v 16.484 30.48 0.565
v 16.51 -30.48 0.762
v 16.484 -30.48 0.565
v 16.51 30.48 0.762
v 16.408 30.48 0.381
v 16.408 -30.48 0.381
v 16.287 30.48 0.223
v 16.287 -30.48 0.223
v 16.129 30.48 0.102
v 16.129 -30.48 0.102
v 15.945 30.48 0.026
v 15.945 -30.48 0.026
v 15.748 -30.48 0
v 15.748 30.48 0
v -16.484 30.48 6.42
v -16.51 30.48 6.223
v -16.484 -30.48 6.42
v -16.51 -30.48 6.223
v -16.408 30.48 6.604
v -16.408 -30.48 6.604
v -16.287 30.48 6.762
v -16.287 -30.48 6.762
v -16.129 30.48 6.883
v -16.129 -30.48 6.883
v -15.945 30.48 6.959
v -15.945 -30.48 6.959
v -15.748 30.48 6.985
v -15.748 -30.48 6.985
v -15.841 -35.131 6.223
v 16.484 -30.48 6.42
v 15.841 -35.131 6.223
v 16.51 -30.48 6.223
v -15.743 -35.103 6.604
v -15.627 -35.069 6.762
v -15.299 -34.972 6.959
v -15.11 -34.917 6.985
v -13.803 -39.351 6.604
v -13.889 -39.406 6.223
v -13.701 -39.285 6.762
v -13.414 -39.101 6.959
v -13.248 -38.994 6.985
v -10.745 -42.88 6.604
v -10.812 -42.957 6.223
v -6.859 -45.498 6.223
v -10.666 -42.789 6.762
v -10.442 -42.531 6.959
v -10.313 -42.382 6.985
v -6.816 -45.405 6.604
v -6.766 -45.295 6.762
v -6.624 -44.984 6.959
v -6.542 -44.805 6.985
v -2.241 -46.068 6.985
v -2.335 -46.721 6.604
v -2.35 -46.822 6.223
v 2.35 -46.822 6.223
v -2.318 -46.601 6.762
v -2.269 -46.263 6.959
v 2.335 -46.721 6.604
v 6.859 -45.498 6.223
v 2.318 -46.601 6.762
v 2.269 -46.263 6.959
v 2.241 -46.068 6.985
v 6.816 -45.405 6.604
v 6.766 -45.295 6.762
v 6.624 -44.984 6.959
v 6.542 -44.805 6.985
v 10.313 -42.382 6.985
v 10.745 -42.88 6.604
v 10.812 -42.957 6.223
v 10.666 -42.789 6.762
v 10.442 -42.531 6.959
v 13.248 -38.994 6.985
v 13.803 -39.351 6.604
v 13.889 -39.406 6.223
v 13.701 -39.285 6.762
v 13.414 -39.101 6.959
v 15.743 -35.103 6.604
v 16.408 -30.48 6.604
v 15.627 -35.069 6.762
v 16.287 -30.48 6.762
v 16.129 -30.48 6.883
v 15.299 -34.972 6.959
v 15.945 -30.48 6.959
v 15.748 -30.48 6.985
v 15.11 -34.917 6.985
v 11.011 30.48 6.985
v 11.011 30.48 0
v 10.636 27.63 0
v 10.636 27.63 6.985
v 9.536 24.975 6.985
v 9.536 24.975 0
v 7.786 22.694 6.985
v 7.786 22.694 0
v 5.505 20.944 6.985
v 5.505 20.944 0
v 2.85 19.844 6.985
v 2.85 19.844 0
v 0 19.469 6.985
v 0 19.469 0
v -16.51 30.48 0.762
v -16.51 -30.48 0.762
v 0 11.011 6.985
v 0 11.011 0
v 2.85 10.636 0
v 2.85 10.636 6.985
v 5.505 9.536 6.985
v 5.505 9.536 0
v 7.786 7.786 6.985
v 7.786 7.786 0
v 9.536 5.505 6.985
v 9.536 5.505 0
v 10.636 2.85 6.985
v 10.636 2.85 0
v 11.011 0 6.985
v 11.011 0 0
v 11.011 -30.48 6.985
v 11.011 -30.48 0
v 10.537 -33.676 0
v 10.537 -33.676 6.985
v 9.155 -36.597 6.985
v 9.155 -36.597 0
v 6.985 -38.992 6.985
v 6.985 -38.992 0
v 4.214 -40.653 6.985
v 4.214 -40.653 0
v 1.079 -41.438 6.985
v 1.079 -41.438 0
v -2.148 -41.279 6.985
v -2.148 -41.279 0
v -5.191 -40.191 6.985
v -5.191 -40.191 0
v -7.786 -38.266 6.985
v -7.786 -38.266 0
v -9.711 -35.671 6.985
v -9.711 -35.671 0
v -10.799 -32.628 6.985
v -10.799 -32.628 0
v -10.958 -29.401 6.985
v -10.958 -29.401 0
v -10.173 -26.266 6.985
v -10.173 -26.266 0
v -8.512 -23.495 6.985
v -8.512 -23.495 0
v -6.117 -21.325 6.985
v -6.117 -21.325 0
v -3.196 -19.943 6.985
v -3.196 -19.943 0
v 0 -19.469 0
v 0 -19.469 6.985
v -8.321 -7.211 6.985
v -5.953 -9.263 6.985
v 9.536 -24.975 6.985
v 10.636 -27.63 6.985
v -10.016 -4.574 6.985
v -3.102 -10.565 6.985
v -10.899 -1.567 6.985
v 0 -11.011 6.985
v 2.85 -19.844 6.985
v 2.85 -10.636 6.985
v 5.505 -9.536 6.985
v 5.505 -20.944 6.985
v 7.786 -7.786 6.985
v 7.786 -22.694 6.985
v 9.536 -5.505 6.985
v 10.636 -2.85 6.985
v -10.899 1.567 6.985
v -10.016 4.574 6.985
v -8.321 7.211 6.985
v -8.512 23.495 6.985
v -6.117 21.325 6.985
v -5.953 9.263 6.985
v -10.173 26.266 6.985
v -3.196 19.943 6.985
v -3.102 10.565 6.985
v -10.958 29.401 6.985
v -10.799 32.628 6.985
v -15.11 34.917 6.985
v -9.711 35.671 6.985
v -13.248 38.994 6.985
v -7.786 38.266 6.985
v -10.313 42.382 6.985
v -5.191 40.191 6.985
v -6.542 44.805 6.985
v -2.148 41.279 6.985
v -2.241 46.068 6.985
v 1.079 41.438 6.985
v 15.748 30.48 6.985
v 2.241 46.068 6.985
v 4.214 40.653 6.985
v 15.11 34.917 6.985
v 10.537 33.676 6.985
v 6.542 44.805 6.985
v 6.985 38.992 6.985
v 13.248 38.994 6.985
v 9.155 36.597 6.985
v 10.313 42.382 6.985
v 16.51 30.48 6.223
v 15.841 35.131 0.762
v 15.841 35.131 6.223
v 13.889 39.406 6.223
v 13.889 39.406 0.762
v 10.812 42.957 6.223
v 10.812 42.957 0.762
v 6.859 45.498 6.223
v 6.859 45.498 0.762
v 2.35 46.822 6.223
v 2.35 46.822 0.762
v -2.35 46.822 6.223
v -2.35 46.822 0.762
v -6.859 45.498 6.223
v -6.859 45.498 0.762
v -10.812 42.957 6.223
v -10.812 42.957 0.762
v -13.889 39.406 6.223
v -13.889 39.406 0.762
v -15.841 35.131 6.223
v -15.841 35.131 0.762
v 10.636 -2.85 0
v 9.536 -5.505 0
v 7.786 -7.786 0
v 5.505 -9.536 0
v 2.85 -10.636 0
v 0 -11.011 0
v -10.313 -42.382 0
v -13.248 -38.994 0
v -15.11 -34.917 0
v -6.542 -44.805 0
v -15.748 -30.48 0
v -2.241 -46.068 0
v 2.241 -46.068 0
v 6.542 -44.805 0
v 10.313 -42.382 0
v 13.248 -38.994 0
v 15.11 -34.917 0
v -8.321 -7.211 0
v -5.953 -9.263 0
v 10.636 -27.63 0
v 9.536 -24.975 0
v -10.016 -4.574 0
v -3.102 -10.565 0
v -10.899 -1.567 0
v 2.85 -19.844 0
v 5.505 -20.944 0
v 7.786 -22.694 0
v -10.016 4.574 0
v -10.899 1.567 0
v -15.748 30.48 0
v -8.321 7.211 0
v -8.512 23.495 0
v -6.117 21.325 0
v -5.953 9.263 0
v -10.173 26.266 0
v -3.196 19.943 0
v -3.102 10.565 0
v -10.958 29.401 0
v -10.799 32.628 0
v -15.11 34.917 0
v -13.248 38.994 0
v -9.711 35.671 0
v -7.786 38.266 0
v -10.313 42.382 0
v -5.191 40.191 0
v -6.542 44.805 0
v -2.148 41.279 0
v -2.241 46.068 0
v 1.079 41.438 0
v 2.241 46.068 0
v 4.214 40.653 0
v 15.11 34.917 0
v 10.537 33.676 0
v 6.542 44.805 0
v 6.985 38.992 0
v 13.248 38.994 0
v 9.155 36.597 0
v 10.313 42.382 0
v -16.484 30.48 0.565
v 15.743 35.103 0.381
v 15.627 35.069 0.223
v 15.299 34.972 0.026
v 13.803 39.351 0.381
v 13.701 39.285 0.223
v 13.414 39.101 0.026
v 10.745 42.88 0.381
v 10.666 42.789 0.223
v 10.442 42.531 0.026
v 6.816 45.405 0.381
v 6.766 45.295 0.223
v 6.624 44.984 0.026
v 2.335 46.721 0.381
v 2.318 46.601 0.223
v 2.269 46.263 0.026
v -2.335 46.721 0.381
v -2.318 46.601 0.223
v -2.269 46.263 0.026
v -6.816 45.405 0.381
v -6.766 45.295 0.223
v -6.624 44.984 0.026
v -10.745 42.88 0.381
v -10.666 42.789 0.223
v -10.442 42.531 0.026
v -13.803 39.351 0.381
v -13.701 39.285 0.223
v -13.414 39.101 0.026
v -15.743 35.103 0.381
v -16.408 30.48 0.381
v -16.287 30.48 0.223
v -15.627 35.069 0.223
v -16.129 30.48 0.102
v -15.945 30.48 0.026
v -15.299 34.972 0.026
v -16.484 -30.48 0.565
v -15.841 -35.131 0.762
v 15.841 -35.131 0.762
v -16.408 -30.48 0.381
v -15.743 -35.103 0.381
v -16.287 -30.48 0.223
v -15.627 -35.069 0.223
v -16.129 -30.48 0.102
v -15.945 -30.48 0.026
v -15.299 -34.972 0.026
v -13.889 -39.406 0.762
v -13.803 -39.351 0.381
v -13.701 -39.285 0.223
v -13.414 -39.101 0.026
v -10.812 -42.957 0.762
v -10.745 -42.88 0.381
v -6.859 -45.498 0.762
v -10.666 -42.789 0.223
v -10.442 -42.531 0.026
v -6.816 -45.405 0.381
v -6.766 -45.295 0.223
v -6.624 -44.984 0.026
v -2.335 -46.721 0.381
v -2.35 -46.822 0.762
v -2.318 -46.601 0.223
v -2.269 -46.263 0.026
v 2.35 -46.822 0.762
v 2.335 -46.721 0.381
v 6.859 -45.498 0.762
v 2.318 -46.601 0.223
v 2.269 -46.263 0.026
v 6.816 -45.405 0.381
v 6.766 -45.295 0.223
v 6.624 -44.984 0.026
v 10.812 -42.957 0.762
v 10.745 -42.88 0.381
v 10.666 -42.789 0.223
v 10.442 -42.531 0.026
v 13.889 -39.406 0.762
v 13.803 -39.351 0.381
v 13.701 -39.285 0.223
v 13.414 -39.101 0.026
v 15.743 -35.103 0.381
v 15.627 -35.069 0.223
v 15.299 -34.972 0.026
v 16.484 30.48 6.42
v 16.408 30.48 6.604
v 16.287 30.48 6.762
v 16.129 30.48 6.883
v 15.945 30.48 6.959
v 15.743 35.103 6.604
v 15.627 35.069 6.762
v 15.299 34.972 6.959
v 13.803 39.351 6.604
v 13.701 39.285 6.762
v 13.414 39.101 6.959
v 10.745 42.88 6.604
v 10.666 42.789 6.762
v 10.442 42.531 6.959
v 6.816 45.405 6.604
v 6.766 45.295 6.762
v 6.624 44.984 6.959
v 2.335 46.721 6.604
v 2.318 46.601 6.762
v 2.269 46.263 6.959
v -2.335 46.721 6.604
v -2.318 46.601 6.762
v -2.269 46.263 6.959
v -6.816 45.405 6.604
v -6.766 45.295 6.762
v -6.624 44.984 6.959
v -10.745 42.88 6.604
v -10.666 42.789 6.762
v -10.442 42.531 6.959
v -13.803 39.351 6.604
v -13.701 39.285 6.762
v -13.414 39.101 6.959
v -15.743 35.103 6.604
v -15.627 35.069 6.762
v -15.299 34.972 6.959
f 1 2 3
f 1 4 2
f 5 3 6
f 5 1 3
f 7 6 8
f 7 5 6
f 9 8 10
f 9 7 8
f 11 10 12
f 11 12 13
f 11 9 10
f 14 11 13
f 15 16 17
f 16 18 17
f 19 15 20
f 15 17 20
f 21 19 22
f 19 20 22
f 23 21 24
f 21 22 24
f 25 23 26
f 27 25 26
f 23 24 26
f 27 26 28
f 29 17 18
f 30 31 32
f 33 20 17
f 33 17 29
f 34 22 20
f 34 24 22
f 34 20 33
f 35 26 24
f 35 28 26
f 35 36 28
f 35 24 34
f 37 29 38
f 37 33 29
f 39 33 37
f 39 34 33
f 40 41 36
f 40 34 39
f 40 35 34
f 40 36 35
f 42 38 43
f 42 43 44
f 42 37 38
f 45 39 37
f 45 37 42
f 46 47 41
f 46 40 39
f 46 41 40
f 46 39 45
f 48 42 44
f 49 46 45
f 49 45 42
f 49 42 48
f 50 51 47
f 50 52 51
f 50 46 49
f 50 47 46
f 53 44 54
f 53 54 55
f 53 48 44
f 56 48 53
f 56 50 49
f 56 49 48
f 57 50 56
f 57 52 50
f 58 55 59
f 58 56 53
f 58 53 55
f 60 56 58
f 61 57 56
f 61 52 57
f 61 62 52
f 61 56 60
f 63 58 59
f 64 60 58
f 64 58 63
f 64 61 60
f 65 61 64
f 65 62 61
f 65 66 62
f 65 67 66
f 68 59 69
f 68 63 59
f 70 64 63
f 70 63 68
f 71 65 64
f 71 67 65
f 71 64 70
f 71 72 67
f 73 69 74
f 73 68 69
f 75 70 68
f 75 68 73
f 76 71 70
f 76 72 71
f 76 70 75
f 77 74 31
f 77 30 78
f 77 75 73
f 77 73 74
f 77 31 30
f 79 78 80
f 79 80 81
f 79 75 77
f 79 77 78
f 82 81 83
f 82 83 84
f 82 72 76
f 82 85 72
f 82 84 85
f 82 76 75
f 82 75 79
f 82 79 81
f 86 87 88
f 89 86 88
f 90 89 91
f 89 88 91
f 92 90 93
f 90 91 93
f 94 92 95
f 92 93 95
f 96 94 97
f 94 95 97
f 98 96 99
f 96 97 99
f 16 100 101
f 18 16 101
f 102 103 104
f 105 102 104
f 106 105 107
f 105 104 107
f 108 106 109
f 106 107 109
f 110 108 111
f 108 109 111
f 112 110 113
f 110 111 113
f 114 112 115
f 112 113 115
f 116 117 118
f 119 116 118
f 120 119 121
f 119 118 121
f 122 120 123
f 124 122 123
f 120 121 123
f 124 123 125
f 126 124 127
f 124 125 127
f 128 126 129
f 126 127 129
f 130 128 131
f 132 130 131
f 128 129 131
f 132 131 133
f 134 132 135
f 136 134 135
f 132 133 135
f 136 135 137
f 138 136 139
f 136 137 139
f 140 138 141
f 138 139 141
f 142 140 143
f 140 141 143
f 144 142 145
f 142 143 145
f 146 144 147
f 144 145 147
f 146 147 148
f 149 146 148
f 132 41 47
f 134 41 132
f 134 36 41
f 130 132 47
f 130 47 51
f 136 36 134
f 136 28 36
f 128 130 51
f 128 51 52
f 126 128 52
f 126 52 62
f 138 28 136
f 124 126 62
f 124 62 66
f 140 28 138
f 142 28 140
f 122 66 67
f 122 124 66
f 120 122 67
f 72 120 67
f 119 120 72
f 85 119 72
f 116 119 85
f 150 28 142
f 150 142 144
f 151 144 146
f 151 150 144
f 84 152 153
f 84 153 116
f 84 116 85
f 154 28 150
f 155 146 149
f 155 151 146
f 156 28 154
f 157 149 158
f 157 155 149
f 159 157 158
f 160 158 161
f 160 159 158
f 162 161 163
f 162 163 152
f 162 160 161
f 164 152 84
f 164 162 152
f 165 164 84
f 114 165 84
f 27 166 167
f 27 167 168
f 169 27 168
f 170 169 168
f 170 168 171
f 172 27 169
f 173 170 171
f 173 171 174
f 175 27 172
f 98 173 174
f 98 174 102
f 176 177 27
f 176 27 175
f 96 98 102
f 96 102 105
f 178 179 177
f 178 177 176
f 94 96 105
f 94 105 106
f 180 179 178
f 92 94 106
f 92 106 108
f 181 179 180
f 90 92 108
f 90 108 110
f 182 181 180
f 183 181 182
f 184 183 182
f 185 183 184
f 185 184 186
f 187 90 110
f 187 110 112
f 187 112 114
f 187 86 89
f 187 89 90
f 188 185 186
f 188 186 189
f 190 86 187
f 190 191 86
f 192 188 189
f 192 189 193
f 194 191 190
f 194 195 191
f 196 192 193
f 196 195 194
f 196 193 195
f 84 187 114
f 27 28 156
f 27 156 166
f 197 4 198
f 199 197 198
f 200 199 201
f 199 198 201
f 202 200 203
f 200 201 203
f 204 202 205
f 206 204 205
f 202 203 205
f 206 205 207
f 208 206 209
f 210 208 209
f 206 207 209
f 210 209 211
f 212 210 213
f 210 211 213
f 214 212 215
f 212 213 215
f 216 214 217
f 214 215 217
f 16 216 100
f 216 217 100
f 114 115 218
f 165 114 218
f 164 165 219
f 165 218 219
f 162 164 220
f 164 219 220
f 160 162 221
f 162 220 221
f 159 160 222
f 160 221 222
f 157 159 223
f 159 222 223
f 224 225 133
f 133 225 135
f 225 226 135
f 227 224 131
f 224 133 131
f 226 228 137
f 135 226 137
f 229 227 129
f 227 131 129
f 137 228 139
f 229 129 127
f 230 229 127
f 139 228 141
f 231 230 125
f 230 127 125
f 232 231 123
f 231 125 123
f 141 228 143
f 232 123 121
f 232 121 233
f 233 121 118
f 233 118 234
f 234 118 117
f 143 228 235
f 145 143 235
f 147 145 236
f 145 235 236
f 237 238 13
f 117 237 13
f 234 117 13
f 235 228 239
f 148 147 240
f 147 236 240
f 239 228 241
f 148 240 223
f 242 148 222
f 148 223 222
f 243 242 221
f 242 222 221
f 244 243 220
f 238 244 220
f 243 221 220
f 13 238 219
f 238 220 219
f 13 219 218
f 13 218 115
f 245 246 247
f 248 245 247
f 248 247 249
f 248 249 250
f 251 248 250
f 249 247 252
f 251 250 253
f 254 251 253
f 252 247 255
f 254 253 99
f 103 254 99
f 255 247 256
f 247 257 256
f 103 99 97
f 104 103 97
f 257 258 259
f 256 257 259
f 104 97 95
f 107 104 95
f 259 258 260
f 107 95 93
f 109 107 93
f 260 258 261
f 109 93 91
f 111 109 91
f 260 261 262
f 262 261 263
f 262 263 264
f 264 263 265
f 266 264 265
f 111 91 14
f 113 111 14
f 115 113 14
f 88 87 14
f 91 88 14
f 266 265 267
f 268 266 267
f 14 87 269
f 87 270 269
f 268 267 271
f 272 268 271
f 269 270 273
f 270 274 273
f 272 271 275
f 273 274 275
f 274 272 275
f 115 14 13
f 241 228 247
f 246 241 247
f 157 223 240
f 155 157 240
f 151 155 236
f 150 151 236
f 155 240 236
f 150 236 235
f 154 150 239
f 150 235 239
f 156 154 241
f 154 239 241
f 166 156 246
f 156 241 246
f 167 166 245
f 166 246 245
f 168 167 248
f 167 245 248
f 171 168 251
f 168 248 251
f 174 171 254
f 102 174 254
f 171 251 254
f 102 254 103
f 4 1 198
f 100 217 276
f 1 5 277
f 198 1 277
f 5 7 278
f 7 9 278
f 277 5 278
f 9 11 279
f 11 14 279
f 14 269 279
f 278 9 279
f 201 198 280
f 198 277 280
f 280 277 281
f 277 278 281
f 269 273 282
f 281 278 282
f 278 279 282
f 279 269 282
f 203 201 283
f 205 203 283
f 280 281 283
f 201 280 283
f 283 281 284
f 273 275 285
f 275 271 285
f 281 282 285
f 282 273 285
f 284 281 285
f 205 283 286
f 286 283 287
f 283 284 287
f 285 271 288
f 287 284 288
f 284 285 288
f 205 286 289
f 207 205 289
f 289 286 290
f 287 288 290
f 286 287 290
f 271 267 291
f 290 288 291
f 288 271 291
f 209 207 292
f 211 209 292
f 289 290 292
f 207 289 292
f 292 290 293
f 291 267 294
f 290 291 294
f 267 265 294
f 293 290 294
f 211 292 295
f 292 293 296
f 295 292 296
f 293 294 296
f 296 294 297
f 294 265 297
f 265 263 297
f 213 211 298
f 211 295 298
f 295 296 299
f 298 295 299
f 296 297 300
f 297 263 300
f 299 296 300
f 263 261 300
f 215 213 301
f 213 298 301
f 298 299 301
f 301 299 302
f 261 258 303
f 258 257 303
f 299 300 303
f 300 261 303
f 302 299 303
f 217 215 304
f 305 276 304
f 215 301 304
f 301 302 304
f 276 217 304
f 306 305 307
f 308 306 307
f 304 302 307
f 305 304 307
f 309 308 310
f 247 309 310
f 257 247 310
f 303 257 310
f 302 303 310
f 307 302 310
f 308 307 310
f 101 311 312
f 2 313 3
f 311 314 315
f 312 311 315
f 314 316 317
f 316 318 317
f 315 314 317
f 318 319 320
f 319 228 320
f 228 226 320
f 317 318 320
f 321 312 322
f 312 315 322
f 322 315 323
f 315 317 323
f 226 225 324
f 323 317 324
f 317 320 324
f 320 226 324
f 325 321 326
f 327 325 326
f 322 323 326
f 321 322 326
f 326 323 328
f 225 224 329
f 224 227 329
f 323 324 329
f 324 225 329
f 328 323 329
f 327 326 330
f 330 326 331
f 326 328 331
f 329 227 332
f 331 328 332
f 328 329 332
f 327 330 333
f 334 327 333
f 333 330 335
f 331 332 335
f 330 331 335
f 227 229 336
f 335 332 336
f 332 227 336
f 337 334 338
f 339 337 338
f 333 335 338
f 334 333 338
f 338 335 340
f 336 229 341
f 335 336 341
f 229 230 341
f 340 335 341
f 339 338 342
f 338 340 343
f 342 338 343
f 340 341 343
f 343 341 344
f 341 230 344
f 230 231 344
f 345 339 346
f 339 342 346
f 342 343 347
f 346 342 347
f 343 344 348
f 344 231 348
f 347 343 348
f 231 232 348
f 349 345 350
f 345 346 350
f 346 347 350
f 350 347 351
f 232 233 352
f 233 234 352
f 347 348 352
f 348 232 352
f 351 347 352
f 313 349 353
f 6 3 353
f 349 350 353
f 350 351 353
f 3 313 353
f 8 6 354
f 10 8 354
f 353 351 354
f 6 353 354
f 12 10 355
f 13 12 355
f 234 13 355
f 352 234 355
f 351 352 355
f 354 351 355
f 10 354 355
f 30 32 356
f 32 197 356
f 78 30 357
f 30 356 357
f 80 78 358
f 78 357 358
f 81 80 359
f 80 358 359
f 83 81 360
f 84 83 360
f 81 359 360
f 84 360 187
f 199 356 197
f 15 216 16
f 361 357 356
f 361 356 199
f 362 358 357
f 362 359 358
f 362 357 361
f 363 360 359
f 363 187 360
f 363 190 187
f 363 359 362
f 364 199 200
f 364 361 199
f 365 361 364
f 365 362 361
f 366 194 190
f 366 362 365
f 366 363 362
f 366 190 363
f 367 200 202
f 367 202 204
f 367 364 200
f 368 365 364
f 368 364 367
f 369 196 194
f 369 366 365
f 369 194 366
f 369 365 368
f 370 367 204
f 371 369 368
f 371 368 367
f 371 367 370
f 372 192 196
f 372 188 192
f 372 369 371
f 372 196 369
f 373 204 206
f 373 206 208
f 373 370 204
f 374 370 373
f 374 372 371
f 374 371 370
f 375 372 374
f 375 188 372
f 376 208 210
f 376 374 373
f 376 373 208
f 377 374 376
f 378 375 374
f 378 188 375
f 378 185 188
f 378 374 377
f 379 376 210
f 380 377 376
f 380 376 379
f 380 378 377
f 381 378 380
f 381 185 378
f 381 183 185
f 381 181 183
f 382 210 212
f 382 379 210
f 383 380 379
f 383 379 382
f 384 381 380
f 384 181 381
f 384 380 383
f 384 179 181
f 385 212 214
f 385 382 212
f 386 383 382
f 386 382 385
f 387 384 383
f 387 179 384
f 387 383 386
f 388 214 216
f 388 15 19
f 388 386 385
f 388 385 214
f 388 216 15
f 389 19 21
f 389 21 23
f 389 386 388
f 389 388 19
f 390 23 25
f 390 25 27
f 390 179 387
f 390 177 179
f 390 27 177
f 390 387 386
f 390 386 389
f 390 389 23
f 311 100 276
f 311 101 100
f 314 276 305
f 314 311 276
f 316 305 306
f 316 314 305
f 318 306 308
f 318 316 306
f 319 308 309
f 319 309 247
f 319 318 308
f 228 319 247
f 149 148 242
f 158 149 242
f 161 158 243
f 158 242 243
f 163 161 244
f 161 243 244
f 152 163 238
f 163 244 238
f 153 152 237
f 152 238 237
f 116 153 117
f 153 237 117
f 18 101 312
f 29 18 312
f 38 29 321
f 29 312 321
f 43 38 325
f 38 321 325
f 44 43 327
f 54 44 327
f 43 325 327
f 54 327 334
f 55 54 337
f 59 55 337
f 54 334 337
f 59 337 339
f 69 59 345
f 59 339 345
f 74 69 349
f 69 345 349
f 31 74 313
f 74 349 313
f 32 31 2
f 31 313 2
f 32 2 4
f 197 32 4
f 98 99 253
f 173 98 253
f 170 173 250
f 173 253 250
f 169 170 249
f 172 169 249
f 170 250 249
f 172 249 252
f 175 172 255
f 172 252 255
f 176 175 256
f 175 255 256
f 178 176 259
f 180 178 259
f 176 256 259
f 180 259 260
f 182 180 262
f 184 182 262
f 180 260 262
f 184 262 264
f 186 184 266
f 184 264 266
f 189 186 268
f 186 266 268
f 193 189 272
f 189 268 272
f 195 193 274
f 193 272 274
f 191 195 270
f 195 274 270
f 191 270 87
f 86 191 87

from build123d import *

# Parameters (mm, degrees)
F1_DEPTH = 6.985
F2_R     = 0.762
F3_R     = 0.762


with BuildPart() as f1:
    # F0 (on Top) → F1 (new body)
    with BuildSketch(Plane.XY):
        with BuildLine():
            ThreePointArc((0, 11.0109), (7.785882, 7.785882), (11.0109, 0))
            ThreePointArc((11.0109, 0), (7.785882, -7.785882), (0, -11.0109))
            Line((0, -11.0109), (0, -13.97))
            ThreePointArc((0, -13.97), (11.674333, -18.805667), (16.51, -30.48))
            Line((16.51, -30.48), (16.51, 30.48))
            ThreePointArc((16.51, 30.48), (11.674333, 18.805667), (0, 13.97))
            Line((0, 13.97), (0, 11.0109))
        make_face()
        with BuildLine():
            ThreePointArc((0, -11.0109), (-11.0109, 0), (0, 11.0109))
            Line((0, 11.0109), (0, 13.97))
            ThreePointArc((0, 13.97), (-11.674333, 18.805667), (-16.51, 30.48))
            Line((-16.51, 30.48), (-16.51, -30.48))
            ThreePointArc((-16.51, -30.48), (-11.674333, -18.805667), (0, -13.97))
            Line((0, -13.97), (0, -11.0109))
        make_face()
        with BuildLine():
            ThreePointArc((11.0109, 30.48), (-7.785882, 38.265882), (0, 19.4691))
            ThreePointArc((0, 19.4691), (7.785882, 22.694118), (11.0109, 30.48))
        make_face()
        with BuildLine():
            ThreePointArc((-16.51, 30.48), (-11.674333, 18.805667), (0, 13.97))
            ThreePointArc((0, 13.97), (11.674333, 18.805667), (16.51, 30.48))
            ThreePointArc((16.51, 30.48), (0, 46.99), (-16.51, 30.48))
        make_face()
        with BuildLine():
            ThreePointArc((11.0109, 30.48), (7.785882, 22.694118), (0, 19.4691))
            ThreePointArc((0, 19.4691), (-7.785882, 38.265882), (11.0109, 30.48))
        make_face(mode=Mode.SUBTRACT)
        with BuildLine():
            ThreePointArc((11.0109, -30.48), (7.785882, -22.694118), (0, -19.4691))
            ThreePointArc((0, -19.4691), (-7.785882, -38.265882), (11.0109, -30.48))
        make_face()
        with BuildLine():
            ThreePointArc((16.51, -30.48), (11.674333, -18.805667), (0, -13.97))
            ThreePointArc((0, -13.97), (-11.674333, -18.805667), (-16.51, -30.48))
            ThreePointArc((-16.51, -30.48), (0, -46.99), (16.51, -30.48))
        make_face()
        with BuildLine():
            ThreePointArc((11.0109, -30.48), (-7.785882, -38.265882), (0, -19.4691))
            ThreePointArc((0, -19.4691), (7.785882, -22.694118), (11.0109, -30.48))
        make_face(mode=Mode.SUBTRACT)
    extrude(amount=F1_DEPTH)

    # F2
    f2_edges = [f1.edges().sort_by_distance(p)[0] for p in [
        (16.51, 0, 6.985),
    ]]
    fillet(f2_edges, radius=F2_R)

    # F3
    f3_edges = [f1.edges().sort_by_distance(p)[0] for p in [
        (0, -46.99, 0),
        (16.51, 0, 0),
        (-16.51, 30.48, 3.1115),
        (-16.51, 0, 0),
    ]]
    fillet(f3_edges, radius=F3_R)


solid = f1.part
